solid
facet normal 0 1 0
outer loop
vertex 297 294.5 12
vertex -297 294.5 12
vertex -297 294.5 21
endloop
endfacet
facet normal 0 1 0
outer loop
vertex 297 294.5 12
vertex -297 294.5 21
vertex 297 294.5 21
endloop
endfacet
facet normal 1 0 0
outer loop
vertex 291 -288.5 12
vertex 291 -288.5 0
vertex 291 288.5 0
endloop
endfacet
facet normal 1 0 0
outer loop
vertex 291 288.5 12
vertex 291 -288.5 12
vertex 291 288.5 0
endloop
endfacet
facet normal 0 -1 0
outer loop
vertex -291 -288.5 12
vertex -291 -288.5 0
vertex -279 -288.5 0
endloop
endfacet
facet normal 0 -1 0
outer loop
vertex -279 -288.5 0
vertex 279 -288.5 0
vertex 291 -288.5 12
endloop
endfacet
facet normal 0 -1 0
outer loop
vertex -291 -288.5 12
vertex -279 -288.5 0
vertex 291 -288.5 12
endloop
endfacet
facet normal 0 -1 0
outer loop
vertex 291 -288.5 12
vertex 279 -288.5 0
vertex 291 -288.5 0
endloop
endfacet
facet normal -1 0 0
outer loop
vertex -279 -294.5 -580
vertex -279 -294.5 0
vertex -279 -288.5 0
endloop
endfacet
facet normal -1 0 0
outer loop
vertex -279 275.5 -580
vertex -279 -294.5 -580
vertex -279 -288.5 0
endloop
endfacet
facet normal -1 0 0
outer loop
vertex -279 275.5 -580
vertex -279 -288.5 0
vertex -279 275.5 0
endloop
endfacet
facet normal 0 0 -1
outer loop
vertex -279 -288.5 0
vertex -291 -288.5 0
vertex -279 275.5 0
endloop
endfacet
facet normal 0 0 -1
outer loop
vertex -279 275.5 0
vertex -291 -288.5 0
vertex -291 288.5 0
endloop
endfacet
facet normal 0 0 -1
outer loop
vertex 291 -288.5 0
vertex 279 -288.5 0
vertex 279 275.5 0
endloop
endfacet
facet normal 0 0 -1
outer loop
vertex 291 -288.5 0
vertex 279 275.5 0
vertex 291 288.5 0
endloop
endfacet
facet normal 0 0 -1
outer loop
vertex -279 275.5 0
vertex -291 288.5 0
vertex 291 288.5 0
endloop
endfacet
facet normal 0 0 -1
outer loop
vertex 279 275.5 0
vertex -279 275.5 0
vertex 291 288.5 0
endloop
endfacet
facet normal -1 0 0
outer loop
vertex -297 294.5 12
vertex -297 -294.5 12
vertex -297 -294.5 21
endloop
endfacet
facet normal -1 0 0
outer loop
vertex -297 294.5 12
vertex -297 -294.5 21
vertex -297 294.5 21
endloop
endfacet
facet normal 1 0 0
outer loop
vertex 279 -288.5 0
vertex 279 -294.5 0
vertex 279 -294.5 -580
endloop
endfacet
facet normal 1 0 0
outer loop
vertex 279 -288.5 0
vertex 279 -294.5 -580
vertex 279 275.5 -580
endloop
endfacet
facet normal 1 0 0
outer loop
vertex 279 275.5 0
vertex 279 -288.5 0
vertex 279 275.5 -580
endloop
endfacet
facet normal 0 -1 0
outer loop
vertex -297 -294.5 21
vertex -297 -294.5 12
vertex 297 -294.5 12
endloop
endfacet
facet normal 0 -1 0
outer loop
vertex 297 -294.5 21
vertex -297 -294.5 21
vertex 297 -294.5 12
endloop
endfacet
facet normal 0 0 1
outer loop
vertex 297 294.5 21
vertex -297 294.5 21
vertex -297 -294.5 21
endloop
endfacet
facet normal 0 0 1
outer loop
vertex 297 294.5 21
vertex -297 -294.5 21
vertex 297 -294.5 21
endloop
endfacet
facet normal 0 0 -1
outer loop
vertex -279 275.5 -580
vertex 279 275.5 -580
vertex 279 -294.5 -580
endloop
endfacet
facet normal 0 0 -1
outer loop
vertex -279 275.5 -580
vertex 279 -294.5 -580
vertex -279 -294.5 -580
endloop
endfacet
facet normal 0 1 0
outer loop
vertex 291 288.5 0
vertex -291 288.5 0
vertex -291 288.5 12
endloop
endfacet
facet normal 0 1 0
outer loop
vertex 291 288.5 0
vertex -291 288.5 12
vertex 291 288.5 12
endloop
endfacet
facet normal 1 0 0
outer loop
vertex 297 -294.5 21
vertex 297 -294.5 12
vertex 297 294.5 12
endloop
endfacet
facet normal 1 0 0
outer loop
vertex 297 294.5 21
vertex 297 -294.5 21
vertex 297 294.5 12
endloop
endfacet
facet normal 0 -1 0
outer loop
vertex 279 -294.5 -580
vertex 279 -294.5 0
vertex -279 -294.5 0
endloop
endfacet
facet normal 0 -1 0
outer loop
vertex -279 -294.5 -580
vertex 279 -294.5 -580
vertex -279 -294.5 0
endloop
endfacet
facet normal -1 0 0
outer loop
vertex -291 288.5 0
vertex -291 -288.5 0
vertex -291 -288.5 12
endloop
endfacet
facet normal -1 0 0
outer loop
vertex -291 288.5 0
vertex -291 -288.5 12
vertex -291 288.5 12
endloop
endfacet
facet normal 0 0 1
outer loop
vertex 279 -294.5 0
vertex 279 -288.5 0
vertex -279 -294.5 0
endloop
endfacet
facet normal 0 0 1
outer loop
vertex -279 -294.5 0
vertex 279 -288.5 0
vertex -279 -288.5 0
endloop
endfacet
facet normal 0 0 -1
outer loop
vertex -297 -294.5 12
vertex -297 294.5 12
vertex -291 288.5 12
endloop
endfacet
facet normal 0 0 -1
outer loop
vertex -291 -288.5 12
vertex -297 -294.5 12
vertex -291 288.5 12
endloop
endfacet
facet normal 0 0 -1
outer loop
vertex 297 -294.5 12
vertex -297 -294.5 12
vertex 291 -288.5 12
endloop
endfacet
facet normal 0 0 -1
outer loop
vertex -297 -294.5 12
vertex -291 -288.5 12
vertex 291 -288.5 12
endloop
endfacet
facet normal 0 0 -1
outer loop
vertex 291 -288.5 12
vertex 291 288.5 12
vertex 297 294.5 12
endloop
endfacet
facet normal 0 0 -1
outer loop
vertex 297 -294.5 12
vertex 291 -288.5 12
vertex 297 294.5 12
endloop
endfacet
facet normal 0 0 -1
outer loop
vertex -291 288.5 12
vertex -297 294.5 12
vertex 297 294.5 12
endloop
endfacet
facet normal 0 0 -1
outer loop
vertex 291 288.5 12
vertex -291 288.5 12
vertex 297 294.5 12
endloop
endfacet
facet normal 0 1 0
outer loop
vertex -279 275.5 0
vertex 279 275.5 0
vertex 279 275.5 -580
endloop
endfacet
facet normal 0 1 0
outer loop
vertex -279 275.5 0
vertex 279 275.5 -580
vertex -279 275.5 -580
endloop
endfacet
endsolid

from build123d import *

# Parameters (mm, degrees)
SKETCH_1_W      = 582
SKETCH_1_H      = 577
EXTRUDE_1_DEPTH = 12
SKETCH_2_W      = 558
SKETCH_2_H      = 570
EXTRUDE_2_DEPTH = 580
SKETCH_3_W      = 594
SKETCH_3_H      = 589
EXTRUDE_3_DEPTH = 9


with BuildPart() as part:
    # Эскиз1 → Бобышка-Вытянуть1 (new body)
    with BuildSketch(Plane.XY):
        Rectangle(SKETCH_1_W, SKETCH_1_H)
    extrude(amount=EXTRUDE_1_DEPTH)

    # Эскиз2 → Бобышка-Вытянуть2 (add)
    with BuildSketch(Plane(origin=(0, 0, 0), x_dir=(-1, 0, 0), z_dir=(0, 0, -1))):
        with Locations((0, -9.5)):
            Rectangle(SKETCH_2_W, SKETCH_2_H)
    extrude(amount=EXTRUDE_2_DEPTH)

    # Эскиз3 → Бобышка-Вытянуть3 (add)
    with BuildSketch(Plane.XY.offset(12)):
        Rectangle(SKETCH_3_W, SKETCH_3_H)
    extrude(amount=EXTRUDE_3_DEPTH)


solid = part.part
